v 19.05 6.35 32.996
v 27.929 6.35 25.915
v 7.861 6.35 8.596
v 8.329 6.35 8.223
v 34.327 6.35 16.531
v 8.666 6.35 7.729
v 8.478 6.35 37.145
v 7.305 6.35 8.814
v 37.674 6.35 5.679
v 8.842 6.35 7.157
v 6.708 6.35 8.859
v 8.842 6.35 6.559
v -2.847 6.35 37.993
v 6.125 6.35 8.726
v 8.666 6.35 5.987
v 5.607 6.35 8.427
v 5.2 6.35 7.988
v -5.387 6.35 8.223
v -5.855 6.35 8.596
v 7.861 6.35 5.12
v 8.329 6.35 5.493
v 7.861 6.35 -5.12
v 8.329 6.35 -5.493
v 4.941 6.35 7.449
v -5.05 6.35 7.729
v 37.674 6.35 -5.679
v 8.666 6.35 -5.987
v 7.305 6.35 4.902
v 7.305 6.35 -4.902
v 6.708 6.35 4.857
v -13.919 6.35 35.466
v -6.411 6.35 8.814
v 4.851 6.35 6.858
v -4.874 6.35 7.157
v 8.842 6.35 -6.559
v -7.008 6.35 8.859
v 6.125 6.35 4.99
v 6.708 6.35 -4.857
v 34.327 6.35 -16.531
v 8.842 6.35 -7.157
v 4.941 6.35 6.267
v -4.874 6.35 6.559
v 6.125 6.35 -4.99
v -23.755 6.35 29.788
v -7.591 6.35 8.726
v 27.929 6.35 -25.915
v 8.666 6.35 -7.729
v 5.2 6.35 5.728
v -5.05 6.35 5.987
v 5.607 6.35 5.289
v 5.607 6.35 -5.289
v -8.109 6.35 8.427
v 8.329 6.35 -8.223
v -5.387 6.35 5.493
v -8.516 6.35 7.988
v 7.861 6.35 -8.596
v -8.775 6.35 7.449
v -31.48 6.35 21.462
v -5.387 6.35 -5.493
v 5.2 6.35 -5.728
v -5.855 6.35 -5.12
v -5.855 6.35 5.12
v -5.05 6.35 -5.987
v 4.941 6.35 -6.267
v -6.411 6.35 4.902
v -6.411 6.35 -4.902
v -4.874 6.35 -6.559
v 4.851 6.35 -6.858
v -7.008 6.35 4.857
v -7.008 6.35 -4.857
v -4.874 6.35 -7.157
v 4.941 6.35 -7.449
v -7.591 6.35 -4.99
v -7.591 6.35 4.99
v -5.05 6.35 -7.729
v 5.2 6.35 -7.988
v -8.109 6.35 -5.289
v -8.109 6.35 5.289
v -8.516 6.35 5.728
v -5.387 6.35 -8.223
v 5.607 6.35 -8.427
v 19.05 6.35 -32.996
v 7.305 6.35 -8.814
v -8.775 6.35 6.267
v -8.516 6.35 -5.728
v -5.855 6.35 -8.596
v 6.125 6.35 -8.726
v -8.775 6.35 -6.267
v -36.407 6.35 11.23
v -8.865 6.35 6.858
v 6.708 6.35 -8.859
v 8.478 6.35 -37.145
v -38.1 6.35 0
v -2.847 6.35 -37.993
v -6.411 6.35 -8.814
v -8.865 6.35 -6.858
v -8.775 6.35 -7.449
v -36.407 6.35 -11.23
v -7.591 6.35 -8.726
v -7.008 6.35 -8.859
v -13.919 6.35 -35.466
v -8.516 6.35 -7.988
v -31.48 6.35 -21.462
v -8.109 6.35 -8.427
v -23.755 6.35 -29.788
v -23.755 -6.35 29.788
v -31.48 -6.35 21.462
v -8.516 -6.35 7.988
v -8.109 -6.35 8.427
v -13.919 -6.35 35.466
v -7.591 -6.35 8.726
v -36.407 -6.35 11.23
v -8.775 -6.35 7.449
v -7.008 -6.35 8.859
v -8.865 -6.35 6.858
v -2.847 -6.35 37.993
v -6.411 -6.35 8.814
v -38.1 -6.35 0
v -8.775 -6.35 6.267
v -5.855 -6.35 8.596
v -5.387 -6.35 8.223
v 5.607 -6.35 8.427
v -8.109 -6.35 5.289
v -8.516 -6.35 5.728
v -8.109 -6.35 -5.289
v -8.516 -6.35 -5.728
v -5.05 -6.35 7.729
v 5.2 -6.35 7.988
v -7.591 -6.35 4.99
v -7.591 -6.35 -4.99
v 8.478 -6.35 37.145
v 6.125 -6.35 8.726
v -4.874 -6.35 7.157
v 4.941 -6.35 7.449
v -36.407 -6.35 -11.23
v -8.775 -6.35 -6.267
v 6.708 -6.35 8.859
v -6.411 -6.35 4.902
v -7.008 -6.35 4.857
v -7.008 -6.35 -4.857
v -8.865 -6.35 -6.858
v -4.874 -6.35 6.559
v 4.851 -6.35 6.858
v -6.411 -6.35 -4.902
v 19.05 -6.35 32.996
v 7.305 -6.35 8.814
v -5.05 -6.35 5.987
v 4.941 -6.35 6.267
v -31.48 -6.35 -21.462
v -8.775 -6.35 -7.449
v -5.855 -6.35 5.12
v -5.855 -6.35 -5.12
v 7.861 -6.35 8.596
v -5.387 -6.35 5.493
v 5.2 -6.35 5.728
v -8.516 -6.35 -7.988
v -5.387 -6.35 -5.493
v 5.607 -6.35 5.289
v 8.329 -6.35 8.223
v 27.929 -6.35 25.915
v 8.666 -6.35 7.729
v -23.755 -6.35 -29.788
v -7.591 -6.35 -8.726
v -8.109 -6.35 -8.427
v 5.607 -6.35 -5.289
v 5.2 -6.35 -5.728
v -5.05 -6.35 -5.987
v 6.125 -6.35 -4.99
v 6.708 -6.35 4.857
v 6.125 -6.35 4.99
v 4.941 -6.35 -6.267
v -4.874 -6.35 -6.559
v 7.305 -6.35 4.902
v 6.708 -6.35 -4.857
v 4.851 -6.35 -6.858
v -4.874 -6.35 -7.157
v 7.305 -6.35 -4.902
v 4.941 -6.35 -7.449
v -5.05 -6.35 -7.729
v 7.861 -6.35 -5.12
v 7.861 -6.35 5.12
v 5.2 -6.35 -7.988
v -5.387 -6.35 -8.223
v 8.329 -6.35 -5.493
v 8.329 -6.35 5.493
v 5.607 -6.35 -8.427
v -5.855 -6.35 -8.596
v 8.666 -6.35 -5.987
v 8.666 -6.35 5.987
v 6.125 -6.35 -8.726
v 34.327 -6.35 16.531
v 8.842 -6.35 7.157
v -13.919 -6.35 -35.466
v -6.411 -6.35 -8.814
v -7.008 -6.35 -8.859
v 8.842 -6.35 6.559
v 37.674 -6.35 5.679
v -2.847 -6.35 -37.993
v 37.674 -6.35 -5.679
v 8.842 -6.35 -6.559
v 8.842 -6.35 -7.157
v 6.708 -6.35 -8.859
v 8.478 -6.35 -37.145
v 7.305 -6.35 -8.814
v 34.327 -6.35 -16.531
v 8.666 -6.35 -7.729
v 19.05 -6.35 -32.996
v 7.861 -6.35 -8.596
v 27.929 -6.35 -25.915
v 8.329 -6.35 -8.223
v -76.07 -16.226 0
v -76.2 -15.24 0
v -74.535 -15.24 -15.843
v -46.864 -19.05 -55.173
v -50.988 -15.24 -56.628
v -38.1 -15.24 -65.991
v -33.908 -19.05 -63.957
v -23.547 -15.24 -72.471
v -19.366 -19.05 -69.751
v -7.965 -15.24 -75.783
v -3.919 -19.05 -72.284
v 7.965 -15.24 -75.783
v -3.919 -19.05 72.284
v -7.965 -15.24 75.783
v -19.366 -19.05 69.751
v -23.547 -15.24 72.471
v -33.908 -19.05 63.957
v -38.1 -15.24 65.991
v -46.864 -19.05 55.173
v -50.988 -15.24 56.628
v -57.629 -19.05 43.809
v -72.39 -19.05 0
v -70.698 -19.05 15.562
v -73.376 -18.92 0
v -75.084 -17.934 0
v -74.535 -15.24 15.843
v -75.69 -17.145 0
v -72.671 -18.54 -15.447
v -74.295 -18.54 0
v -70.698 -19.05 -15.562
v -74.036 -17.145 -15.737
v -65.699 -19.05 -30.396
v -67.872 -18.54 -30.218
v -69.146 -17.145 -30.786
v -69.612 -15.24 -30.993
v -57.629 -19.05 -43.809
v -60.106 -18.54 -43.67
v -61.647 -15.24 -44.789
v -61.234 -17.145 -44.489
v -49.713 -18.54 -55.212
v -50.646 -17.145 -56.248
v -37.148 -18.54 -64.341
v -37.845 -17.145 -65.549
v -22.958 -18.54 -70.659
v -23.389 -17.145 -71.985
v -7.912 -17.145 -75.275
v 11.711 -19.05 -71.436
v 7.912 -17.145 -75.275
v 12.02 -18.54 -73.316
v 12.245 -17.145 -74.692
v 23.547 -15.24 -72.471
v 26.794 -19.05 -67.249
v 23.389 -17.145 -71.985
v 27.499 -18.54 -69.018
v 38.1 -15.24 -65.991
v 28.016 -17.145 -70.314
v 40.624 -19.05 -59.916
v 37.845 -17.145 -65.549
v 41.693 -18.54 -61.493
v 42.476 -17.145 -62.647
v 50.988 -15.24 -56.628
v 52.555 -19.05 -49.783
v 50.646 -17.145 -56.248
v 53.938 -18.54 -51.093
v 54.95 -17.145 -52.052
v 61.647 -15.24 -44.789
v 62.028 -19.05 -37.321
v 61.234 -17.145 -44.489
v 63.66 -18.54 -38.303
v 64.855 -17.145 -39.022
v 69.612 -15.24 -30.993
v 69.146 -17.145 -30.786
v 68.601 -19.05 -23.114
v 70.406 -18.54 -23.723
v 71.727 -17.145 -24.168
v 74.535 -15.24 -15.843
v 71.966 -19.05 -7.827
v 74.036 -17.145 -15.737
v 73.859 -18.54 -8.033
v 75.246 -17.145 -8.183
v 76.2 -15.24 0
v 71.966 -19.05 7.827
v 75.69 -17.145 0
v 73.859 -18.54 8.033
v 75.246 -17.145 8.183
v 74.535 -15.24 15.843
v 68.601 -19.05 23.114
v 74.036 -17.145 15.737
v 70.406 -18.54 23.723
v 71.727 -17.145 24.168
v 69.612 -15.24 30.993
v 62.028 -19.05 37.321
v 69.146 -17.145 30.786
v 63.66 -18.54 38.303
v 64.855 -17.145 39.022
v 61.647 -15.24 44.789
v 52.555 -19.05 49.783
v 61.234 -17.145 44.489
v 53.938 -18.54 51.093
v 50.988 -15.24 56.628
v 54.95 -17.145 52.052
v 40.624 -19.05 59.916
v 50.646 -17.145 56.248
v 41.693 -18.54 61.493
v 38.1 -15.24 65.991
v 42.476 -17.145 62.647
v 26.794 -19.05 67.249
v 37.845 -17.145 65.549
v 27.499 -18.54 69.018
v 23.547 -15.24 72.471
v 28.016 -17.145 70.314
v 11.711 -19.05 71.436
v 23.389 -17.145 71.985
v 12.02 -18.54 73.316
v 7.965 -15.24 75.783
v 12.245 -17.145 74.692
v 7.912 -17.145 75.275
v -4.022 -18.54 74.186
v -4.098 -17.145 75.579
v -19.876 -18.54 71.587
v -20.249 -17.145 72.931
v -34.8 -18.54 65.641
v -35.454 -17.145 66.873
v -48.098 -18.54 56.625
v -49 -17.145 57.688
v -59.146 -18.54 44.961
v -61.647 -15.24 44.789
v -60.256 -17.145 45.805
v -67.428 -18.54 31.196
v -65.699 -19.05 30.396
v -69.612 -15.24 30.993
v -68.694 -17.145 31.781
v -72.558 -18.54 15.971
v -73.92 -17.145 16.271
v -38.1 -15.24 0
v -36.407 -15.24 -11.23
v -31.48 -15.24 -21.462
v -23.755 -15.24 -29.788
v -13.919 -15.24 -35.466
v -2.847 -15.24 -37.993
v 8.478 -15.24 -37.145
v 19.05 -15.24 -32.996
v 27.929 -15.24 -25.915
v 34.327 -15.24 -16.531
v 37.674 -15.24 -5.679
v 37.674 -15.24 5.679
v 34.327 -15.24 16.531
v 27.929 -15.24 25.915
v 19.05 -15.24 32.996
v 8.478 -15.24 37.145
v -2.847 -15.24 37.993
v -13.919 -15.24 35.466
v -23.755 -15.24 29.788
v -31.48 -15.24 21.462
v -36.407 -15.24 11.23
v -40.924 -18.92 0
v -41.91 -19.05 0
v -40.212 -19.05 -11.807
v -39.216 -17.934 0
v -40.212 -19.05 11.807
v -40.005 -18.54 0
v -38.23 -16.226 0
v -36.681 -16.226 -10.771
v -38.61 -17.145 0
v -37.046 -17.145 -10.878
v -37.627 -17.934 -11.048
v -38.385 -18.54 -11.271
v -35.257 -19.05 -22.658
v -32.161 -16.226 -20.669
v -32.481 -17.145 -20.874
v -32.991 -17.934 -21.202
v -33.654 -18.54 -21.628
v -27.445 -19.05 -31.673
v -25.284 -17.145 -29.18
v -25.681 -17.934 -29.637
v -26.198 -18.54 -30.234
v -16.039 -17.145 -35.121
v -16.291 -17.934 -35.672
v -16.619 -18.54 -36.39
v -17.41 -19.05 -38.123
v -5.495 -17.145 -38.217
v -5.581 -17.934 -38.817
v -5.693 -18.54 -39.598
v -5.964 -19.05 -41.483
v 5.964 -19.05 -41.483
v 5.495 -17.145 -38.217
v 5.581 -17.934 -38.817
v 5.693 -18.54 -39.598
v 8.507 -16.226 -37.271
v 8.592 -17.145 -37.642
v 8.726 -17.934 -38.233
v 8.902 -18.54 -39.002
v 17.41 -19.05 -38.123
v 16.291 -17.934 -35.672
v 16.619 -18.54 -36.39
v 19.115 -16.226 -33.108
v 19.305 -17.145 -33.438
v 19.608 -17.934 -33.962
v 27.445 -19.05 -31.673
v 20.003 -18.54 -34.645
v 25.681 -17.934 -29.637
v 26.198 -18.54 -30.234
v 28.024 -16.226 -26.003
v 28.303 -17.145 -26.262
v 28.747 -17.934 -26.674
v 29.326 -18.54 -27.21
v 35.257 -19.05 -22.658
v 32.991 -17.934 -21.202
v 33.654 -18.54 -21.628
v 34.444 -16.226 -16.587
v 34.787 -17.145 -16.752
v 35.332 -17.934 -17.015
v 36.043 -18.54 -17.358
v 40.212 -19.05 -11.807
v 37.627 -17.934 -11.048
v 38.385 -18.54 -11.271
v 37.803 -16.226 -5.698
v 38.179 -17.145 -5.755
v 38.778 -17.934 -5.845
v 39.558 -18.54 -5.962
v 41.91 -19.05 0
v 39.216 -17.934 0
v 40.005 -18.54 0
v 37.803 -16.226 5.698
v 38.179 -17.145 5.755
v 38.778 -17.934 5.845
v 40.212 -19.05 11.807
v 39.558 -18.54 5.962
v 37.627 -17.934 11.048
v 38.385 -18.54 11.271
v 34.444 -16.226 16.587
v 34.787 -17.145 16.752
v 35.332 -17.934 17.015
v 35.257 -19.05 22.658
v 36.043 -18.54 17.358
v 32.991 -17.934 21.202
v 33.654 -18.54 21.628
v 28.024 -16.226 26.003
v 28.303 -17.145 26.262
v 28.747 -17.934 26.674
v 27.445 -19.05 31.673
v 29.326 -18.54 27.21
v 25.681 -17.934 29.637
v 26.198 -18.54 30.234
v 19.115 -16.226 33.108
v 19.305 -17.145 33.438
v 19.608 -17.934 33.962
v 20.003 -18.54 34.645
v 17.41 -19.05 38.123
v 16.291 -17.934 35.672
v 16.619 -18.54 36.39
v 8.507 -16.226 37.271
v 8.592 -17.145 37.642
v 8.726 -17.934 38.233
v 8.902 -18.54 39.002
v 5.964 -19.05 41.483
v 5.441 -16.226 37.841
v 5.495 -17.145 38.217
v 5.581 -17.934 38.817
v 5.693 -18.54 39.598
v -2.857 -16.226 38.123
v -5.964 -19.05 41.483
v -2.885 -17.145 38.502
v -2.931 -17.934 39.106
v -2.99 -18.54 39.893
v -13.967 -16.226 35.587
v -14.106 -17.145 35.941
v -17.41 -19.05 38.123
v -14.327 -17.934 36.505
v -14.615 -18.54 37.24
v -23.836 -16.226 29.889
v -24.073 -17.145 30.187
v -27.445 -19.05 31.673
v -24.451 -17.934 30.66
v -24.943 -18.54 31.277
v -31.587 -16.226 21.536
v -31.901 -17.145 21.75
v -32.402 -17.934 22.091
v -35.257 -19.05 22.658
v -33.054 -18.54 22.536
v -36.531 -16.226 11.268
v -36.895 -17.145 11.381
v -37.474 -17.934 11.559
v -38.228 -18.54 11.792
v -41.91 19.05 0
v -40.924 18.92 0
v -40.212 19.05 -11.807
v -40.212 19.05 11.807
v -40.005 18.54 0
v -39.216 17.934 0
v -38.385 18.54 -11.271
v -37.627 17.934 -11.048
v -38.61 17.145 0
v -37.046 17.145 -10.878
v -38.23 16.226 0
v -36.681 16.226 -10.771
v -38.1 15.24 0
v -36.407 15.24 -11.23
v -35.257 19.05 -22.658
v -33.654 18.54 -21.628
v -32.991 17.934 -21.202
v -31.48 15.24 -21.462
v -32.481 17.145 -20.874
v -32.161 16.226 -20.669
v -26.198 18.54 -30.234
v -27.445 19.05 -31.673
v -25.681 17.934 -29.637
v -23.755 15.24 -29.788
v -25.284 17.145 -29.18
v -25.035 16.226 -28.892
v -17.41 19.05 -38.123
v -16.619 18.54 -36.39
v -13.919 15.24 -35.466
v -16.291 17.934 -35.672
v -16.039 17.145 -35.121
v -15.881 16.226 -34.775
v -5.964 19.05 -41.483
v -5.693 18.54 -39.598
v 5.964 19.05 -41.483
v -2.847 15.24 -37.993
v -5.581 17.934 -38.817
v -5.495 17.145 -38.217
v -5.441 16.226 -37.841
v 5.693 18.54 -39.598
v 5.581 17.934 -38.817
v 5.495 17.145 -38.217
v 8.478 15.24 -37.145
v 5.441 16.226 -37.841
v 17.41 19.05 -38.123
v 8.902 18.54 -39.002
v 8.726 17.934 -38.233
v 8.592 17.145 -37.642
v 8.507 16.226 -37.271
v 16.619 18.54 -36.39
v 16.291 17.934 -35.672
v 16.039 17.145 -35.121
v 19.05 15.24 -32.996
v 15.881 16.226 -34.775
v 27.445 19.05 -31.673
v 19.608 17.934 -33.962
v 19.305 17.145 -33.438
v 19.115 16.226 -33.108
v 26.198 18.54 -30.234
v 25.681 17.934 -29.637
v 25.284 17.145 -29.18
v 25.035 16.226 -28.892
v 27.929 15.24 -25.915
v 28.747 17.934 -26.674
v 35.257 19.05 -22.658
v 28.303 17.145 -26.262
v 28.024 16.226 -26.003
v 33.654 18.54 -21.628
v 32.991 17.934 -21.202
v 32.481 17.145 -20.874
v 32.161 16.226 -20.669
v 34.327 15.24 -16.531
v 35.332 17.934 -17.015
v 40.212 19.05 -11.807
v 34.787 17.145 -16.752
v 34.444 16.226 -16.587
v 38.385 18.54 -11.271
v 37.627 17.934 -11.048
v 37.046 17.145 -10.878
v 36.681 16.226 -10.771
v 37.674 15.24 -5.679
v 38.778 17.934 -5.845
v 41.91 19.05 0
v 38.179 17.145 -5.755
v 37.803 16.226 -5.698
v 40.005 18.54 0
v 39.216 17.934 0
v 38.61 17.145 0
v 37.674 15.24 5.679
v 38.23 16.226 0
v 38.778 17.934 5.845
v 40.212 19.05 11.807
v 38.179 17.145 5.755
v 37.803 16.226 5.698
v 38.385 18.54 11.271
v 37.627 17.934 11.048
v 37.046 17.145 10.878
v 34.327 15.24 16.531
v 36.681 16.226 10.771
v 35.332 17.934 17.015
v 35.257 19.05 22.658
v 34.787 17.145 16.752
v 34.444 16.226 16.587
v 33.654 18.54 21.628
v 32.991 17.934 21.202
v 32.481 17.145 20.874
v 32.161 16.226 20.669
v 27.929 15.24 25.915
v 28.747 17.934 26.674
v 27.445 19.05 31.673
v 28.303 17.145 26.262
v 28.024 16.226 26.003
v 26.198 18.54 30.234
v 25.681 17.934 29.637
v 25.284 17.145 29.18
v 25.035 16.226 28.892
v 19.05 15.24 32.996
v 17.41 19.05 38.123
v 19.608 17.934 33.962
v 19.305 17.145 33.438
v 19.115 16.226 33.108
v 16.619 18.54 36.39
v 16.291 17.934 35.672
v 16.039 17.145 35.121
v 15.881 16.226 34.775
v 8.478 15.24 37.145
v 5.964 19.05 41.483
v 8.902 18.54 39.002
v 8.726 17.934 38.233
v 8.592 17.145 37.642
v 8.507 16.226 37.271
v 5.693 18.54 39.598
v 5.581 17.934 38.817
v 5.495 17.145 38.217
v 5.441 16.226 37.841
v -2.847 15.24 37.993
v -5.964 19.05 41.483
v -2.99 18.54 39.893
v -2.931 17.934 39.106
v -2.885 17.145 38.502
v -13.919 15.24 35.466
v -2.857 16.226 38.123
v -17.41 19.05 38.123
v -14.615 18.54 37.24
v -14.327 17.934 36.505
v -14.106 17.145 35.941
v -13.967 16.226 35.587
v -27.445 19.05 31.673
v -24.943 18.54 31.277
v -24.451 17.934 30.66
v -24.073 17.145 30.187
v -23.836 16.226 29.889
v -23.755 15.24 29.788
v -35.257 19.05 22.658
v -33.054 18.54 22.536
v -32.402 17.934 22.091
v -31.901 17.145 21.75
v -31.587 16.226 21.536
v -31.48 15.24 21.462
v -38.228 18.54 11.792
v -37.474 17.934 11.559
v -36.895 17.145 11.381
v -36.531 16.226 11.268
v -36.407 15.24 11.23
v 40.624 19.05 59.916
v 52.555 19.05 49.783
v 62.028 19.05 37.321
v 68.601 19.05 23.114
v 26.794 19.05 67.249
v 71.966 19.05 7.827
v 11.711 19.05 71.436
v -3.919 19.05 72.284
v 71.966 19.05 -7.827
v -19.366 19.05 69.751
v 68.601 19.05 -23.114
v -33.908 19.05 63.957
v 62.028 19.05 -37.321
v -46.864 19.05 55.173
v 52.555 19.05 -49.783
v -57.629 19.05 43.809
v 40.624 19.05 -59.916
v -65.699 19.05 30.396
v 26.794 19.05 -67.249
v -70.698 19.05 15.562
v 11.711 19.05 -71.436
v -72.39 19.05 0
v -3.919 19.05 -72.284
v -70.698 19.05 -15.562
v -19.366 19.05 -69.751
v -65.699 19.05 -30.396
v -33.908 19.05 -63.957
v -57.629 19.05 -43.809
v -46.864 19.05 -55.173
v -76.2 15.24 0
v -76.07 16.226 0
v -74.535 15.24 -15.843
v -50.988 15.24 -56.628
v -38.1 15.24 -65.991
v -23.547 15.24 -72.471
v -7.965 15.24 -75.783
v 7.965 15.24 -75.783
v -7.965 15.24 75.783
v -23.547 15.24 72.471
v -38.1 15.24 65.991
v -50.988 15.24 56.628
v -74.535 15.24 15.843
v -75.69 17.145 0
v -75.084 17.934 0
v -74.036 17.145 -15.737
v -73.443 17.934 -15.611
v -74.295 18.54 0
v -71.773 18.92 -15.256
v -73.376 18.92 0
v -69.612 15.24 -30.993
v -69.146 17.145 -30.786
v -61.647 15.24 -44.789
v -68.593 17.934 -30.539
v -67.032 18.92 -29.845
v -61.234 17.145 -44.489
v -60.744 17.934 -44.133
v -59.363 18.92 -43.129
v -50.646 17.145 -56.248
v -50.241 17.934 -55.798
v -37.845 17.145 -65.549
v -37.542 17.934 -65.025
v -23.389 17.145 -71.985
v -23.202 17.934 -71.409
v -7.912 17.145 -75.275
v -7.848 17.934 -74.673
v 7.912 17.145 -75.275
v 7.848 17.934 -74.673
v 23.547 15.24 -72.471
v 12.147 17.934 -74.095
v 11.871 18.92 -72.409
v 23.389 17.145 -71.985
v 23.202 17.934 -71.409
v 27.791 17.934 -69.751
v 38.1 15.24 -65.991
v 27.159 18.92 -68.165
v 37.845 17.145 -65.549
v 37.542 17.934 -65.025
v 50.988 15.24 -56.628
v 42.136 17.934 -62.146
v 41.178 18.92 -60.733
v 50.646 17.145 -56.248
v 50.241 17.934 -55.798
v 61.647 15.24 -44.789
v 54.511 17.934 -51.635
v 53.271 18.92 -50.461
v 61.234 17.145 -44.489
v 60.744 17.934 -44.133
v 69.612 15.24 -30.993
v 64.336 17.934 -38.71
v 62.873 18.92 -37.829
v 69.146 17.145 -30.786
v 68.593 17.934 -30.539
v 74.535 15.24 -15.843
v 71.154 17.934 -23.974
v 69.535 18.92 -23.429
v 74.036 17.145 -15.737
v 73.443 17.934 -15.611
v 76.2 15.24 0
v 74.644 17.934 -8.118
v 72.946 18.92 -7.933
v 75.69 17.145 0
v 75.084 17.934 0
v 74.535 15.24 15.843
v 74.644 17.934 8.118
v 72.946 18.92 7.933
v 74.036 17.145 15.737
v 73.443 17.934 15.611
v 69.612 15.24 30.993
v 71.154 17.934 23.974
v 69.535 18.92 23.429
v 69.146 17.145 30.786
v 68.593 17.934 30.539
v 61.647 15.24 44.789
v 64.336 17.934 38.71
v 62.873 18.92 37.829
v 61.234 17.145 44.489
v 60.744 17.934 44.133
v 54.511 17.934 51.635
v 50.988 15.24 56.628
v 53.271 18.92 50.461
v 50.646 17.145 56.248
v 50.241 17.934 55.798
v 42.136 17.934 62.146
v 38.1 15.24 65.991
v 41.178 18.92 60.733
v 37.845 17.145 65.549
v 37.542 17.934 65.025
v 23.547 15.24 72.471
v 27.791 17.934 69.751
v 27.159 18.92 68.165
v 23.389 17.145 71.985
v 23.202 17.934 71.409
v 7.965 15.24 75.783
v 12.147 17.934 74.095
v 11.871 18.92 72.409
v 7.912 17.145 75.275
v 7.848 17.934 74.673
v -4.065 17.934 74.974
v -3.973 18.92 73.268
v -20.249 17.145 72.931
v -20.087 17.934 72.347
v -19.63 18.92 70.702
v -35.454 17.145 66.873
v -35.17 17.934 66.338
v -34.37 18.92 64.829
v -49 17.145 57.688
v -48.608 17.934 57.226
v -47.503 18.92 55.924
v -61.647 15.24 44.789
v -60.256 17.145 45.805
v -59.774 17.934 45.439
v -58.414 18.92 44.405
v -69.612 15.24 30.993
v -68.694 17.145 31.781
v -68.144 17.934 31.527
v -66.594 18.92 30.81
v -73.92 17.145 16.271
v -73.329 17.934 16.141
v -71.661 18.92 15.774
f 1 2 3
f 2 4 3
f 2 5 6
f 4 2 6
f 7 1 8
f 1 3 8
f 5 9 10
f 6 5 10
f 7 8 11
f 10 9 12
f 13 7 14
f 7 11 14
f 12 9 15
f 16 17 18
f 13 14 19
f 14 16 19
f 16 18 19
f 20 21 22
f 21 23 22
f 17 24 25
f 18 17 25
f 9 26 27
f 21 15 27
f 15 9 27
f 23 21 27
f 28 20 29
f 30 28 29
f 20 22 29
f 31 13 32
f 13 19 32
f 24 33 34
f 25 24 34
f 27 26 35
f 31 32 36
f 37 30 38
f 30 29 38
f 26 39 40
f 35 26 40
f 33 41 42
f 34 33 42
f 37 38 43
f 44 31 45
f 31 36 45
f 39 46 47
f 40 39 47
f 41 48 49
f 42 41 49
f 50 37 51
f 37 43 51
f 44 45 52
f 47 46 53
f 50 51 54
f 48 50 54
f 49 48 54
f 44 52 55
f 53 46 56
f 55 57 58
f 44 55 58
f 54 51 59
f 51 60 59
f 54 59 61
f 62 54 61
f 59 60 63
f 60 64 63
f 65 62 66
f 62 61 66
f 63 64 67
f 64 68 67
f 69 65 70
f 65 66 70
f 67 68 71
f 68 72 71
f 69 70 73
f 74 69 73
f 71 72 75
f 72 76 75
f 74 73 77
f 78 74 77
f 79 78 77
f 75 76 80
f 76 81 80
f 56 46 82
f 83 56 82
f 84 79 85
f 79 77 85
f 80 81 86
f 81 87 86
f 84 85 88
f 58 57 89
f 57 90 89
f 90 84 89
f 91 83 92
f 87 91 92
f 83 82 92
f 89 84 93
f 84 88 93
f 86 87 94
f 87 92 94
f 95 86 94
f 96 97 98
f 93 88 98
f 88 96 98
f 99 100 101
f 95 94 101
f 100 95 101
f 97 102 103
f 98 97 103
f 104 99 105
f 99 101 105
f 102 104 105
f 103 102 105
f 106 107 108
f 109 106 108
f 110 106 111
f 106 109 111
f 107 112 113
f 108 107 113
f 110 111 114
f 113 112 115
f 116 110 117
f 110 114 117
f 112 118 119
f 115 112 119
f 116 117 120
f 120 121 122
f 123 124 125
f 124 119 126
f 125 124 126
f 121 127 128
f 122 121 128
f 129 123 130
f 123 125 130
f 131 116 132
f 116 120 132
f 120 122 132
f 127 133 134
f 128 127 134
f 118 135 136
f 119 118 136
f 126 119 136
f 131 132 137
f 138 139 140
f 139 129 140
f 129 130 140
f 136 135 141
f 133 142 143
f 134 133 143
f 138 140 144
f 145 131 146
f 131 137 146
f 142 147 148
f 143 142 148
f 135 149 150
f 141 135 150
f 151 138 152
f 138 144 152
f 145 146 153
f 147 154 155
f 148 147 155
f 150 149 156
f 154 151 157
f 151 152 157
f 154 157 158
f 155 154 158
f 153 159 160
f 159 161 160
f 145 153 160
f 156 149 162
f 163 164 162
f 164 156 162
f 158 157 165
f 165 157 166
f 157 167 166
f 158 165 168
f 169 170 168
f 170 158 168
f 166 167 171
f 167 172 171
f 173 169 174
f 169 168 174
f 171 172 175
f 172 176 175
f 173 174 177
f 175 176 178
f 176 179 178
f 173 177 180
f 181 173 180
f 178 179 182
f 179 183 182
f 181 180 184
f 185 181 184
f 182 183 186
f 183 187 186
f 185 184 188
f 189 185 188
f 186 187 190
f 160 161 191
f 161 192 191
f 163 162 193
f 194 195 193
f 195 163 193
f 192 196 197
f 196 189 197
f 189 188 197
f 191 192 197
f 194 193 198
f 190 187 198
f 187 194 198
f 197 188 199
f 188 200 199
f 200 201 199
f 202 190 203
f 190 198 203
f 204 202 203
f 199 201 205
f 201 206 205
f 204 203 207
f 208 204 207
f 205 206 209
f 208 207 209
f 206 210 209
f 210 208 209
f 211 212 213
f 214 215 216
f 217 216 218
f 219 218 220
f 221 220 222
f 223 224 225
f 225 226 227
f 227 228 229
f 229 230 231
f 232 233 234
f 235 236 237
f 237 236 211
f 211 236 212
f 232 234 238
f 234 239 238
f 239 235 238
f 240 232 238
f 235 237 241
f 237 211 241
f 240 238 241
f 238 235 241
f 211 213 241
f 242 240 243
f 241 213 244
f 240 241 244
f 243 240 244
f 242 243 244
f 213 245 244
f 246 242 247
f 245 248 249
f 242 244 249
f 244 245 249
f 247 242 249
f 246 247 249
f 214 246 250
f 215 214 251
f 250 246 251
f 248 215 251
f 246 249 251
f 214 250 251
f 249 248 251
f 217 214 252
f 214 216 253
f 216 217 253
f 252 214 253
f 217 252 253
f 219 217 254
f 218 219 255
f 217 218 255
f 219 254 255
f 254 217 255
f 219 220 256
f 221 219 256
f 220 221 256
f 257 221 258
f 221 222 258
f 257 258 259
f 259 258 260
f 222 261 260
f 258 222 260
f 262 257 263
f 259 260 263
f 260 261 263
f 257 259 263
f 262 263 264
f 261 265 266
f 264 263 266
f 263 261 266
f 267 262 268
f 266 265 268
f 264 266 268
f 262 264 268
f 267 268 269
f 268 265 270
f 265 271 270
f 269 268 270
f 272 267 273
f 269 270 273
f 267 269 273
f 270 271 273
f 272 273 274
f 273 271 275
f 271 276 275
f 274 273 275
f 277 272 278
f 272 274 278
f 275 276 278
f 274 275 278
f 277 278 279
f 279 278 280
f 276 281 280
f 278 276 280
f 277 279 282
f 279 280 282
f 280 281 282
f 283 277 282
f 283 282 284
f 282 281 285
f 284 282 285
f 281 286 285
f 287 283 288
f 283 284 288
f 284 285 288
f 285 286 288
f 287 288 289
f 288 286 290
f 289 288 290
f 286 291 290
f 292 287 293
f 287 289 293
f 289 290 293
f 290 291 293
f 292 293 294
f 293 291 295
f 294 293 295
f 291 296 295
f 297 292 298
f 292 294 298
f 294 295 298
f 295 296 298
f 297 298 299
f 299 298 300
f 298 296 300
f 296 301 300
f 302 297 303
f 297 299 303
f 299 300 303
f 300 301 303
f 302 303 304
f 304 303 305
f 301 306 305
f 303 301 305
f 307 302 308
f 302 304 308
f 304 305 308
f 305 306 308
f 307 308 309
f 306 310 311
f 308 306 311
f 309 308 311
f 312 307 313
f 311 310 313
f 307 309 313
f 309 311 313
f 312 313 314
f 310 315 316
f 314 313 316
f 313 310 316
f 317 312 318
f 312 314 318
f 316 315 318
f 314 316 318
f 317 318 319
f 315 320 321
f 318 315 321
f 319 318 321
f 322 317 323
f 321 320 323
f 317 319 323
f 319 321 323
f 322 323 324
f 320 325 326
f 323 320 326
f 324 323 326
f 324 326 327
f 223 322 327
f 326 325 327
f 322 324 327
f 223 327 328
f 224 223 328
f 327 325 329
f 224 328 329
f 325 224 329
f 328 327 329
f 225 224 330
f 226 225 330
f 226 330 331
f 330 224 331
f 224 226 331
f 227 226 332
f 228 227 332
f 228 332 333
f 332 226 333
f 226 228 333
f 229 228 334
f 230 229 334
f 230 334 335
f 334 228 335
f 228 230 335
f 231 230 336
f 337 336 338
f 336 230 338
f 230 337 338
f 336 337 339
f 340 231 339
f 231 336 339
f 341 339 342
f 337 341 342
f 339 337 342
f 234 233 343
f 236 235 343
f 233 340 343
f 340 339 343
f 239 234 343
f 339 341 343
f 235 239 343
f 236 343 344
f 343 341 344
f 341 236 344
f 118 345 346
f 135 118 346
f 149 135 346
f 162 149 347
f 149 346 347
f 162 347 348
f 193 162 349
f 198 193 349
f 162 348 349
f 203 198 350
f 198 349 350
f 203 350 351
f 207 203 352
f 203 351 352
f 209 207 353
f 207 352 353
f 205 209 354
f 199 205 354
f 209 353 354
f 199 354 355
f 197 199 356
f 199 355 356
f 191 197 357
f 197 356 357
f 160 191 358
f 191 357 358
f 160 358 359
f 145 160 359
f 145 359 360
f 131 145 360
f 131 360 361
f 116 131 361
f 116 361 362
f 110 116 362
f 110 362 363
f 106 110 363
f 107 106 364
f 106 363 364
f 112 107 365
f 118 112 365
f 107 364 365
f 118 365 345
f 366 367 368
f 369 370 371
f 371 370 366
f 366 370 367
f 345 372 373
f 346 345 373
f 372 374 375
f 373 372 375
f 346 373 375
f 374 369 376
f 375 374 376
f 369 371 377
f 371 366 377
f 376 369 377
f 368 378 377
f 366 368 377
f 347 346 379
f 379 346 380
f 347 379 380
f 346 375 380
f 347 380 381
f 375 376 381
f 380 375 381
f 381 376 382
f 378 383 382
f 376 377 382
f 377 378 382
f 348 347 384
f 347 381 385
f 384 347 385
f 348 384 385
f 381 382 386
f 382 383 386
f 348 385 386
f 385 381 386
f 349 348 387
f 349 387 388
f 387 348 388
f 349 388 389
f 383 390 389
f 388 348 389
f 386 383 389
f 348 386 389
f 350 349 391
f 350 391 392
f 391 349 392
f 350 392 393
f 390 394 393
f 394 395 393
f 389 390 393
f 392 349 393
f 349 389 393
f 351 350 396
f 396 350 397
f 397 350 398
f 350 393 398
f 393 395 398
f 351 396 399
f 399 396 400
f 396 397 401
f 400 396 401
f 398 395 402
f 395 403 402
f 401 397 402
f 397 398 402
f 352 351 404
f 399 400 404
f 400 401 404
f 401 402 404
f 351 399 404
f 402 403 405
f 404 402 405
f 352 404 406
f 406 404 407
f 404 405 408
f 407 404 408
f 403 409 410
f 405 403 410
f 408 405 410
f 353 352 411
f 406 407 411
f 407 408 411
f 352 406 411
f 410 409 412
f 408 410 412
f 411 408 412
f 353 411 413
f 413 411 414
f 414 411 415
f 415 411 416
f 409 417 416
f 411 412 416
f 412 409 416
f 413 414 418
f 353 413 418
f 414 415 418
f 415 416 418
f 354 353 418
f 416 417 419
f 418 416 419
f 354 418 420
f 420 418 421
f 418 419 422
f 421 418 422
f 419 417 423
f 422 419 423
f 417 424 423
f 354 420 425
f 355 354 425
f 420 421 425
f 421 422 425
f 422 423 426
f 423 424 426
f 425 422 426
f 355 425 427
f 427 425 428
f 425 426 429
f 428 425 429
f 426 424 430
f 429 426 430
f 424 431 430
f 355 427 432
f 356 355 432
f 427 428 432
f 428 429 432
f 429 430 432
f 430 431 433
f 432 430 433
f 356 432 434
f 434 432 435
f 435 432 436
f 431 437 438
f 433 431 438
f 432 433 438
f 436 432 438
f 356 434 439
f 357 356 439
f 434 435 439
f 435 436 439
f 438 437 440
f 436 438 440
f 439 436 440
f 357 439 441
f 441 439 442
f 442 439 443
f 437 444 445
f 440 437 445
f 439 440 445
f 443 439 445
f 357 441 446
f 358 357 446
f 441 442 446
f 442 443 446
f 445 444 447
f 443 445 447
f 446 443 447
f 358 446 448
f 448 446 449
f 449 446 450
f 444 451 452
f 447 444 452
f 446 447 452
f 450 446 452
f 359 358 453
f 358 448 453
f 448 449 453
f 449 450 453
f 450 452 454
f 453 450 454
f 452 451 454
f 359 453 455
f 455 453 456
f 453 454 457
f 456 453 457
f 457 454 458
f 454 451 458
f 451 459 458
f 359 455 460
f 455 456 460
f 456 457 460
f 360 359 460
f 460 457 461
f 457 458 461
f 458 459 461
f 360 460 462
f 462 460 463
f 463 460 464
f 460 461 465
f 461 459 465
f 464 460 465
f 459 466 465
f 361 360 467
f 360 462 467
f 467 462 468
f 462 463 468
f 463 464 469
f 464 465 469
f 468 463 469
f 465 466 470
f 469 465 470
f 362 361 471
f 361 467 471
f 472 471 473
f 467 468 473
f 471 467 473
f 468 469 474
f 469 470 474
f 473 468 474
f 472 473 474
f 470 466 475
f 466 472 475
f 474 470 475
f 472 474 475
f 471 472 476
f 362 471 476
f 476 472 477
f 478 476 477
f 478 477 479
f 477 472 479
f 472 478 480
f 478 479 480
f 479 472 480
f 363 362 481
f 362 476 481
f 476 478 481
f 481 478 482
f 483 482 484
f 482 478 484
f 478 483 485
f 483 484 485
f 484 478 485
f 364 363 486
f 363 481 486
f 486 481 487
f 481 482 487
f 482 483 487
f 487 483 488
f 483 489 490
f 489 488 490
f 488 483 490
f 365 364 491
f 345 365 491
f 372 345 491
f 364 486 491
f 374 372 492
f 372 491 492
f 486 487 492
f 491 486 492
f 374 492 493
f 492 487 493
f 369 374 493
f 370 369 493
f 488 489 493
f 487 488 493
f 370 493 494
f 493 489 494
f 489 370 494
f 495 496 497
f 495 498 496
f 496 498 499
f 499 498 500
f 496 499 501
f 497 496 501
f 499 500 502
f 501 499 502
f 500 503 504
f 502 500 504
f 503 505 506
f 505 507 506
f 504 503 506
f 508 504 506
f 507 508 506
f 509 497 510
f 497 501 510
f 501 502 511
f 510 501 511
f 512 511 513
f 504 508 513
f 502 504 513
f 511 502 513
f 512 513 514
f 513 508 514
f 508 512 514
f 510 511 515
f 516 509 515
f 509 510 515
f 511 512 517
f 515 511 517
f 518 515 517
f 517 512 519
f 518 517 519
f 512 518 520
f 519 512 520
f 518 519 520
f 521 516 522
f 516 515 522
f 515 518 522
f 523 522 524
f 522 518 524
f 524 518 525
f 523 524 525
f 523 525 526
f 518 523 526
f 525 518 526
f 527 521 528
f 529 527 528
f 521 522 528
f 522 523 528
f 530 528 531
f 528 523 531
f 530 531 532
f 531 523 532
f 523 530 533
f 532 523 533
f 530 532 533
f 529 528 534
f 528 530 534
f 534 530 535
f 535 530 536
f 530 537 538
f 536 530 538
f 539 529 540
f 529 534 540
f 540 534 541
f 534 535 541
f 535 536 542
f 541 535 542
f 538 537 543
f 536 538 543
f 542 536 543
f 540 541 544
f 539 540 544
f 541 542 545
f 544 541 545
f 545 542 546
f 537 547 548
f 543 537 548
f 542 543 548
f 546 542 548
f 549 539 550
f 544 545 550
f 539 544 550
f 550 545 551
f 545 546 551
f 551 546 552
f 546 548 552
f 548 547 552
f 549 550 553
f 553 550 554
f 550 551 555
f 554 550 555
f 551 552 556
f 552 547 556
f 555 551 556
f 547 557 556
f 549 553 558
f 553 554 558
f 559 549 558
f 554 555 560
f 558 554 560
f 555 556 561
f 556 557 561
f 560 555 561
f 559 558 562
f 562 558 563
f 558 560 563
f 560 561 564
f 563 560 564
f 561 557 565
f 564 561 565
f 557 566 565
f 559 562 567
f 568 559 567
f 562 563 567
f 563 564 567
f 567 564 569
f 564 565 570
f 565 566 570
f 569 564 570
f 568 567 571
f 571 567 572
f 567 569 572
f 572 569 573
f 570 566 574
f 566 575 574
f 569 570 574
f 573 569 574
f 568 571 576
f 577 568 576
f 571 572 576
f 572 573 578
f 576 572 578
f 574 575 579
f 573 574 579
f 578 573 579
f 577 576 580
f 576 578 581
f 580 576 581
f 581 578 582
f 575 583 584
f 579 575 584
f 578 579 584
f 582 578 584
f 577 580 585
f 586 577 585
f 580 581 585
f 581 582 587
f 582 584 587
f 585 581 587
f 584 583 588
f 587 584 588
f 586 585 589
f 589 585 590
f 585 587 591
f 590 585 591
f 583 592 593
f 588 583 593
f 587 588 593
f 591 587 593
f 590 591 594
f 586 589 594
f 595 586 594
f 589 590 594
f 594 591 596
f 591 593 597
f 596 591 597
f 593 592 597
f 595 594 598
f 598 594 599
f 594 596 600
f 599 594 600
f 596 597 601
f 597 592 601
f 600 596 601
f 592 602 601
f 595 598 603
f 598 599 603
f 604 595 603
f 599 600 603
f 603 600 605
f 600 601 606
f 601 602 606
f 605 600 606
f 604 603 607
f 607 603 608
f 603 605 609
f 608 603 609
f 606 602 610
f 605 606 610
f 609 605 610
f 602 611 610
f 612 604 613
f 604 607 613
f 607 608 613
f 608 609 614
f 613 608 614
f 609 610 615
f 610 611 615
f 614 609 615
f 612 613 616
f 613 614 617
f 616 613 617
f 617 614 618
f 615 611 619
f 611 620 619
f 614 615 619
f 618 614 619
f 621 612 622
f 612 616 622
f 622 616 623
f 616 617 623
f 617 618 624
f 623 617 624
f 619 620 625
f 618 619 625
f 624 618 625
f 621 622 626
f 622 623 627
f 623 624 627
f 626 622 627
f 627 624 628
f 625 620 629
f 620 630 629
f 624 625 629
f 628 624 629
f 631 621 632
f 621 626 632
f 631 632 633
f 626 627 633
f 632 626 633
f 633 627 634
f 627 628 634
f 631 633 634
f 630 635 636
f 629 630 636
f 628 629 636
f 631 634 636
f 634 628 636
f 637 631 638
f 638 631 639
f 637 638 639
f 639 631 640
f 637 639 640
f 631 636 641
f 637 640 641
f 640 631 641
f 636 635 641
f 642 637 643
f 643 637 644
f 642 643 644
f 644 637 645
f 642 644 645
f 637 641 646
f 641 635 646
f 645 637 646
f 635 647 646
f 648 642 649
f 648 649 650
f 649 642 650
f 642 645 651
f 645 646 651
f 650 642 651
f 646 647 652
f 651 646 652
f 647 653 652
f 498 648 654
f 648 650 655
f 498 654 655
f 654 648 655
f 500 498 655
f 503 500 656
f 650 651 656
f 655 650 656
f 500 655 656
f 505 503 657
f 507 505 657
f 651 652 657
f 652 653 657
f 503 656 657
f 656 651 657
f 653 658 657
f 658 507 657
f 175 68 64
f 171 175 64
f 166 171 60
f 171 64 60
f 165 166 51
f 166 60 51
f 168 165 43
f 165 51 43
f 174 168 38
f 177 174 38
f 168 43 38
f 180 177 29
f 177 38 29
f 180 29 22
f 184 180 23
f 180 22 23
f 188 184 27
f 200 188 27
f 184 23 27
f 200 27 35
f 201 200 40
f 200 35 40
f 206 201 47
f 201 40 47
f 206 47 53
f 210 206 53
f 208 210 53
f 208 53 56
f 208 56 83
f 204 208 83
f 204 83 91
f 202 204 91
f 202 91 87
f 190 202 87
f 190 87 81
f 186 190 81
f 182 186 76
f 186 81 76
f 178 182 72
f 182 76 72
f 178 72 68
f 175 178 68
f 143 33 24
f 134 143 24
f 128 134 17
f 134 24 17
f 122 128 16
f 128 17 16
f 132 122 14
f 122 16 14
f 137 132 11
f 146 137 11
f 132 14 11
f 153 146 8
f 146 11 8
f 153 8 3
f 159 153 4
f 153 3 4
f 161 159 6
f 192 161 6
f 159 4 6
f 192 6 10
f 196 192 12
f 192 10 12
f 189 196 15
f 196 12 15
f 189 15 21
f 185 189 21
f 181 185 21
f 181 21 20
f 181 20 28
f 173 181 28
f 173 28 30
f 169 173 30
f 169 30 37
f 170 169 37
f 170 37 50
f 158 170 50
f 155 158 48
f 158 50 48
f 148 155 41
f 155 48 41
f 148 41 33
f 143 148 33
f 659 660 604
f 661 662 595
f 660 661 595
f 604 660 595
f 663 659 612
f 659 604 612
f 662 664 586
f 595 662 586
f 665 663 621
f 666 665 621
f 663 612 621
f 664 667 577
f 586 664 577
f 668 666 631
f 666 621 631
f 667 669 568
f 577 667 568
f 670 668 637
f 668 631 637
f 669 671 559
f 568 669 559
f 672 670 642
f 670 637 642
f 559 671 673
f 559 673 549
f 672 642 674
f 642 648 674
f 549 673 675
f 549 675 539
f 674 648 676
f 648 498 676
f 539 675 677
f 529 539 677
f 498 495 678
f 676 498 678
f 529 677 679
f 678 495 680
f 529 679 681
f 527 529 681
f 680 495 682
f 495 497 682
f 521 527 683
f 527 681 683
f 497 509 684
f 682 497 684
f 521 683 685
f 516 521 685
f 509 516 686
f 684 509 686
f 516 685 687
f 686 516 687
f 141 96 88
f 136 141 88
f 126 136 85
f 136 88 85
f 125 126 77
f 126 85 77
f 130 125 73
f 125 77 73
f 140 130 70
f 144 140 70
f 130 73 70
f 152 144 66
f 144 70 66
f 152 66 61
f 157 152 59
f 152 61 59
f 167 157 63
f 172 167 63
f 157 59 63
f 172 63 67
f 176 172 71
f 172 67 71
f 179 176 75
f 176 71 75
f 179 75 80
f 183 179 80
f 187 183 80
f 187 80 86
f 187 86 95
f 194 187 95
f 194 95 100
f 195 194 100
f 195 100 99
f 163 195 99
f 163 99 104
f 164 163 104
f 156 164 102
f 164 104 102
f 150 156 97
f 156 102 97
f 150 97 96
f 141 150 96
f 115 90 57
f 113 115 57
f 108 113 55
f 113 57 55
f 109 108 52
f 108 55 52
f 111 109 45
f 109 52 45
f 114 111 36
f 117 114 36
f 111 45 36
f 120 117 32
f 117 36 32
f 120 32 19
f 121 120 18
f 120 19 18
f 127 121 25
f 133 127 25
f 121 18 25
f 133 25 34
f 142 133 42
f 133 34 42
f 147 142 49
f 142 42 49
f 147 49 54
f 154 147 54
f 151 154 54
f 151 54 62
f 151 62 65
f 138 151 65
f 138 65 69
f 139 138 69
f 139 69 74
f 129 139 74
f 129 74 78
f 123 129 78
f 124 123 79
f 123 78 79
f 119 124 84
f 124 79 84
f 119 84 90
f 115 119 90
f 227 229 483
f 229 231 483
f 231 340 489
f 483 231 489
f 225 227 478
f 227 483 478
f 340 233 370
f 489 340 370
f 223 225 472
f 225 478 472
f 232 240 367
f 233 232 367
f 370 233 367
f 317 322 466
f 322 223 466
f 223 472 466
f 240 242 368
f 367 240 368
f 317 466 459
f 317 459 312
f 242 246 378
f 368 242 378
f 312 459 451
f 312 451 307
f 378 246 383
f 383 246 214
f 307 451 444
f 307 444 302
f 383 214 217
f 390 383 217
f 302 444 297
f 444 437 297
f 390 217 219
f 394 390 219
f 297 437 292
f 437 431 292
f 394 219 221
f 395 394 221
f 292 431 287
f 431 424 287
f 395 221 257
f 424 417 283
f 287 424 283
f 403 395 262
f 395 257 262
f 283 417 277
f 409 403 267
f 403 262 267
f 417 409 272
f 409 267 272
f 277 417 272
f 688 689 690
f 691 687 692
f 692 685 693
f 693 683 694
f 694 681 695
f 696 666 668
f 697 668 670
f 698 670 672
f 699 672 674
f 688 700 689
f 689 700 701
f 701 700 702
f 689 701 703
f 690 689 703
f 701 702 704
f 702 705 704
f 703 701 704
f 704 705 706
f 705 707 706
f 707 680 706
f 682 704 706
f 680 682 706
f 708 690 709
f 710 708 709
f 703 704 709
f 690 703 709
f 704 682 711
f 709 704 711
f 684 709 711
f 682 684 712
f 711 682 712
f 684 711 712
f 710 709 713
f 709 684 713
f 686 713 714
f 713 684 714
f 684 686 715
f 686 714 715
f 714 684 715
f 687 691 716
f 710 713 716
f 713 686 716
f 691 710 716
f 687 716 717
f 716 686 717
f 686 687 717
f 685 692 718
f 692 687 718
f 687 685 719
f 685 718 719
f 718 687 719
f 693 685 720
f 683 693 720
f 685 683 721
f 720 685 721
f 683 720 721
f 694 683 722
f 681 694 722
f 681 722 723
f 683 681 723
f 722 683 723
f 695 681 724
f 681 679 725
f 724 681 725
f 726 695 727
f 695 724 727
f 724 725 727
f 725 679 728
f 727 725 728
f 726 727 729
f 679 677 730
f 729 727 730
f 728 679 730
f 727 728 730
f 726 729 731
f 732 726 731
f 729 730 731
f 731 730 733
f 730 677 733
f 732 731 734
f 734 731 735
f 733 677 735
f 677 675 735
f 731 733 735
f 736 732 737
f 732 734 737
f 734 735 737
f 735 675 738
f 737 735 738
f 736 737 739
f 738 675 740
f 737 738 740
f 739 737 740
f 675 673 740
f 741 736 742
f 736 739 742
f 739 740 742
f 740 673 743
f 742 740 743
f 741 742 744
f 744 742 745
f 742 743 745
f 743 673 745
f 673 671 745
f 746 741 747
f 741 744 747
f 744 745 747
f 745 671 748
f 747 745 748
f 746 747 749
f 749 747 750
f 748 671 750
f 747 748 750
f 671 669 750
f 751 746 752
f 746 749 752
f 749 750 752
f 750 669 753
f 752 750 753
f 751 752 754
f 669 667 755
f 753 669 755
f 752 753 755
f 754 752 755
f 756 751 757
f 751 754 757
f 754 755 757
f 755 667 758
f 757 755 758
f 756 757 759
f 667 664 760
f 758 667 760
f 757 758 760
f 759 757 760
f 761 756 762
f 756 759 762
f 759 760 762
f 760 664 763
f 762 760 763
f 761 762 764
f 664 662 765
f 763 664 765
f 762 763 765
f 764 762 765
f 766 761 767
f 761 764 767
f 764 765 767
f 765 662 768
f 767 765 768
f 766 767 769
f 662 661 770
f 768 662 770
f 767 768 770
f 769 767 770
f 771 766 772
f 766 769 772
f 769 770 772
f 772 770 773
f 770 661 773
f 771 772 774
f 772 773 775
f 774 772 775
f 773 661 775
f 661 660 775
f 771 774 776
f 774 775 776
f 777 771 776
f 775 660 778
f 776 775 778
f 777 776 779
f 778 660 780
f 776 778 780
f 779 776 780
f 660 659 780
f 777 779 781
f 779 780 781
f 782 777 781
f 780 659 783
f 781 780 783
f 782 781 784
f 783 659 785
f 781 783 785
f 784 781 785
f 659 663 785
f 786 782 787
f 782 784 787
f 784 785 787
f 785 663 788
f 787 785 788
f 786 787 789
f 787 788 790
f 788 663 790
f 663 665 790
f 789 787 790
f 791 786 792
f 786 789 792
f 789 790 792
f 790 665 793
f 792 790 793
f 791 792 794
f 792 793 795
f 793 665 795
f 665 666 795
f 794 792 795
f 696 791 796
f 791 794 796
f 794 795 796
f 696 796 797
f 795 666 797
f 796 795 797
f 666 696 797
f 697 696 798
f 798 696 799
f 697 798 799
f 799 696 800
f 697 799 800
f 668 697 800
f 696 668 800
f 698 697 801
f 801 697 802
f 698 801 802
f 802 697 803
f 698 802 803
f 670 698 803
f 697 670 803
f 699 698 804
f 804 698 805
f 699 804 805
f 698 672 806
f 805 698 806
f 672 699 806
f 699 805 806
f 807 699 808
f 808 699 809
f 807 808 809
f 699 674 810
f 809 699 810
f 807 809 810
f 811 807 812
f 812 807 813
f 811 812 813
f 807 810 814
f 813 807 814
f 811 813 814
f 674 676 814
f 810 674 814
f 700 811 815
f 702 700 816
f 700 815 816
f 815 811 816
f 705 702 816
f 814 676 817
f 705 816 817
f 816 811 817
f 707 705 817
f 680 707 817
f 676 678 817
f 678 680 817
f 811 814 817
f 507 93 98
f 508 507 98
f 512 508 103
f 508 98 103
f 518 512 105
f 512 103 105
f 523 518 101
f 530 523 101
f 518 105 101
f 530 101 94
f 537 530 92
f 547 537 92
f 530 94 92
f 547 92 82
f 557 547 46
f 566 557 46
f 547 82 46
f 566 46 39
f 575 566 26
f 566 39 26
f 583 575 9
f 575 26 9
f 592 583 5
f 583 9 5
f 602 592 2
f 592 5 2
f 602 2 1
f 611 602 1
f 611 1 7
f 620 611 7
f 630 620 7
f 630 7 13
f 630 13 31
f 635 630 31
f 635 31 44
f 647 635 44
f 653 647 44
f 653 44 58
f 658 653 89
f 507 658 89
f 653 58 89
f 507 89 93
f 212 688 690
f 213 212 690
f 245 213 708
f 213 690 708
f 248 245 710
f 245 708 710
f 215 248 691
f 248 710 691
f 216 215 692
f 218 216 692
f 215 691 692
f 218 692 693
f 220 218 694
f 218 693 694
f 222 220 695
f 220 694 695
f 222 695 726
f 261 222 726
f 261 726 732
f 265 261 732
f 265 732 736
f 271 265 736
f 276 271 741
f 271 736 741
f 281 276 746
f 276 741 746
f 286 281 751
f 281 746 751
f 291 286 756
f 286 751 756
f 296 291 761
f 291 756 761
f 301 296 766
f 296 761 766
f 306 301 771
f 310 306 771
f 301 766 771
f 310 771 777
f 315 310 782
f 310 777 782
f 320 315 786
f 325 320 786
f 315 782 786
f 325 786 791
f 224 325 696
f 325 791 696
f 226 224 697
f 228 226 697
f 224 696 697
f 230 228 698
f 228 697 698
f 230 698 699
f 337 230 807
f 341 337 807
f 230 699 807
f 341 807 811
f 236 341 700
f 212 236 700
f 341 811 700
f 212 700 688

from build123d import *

# Parameters (mm, degrees)
WHEEL_EDGES_FILLET_R     = 3.81
SKETCH2_R                = 2.0066
F_4_MOUNTING_HOLES_DEPTH = 12.7


with BuildPart() as part:
    # Wheel Cross Section → Main Wheel Rev (revolve)
    with BuildSketch(Plane.XY):
        Polygon((0, 6.35), (0, -6.35), (-38.1, -6.35), (-38.1, -19.05), (-76.2, -19.05), (-76.2, 19.05), (-38.1, 19.05), (-38.1, 6.35), align=None)
    revolve(axis=Axis((0, 6.35, 0), (0, -1, 0)))

    # Wheel Edges Fillet
    wheel_edges_fillet_edges = [part.edges().sort_by_distance(p)[0] for p in [
        (38.1, 19.05, 0),
        (38.1, -19.05, 0),
        (76.2, -19.05, 0),
        (76.2, 19.05, 0),
    ]]
    fillet(wheel_edges_fillet_edges, radius=WHEEL_EDGES_FILLET_R)

    # Sketch2 → 4 Mounting Holes (cut)
    with BuildSketch(Plane(origin=(0, 6.35, 0), x_dir=(1, 0, 0), z_dir=(0, 1, 0))):
        with Locations(Location((-6.858, 6.858, 0), (0, 0, 180))):
            Circle(SKETCH2_R)
        with Locations(Location((6.858, 6.858, 0), (0, 0, 180))):
            Circle(SKETCH2_R)
        with Locations(Location((6.858, -6.858, 0), (0, 0, 180))):
            Circle(SKETCH2_R)
        with Locations(Location((-6.858, -6.858, 0), (0, 0, 180))):
            Circle(SKETCH2_R)
    extrude(amount=-F_4_MOUNTING_HOLES_DEPTH, mode=Mode.SUBTRACT)


solid = part.part
